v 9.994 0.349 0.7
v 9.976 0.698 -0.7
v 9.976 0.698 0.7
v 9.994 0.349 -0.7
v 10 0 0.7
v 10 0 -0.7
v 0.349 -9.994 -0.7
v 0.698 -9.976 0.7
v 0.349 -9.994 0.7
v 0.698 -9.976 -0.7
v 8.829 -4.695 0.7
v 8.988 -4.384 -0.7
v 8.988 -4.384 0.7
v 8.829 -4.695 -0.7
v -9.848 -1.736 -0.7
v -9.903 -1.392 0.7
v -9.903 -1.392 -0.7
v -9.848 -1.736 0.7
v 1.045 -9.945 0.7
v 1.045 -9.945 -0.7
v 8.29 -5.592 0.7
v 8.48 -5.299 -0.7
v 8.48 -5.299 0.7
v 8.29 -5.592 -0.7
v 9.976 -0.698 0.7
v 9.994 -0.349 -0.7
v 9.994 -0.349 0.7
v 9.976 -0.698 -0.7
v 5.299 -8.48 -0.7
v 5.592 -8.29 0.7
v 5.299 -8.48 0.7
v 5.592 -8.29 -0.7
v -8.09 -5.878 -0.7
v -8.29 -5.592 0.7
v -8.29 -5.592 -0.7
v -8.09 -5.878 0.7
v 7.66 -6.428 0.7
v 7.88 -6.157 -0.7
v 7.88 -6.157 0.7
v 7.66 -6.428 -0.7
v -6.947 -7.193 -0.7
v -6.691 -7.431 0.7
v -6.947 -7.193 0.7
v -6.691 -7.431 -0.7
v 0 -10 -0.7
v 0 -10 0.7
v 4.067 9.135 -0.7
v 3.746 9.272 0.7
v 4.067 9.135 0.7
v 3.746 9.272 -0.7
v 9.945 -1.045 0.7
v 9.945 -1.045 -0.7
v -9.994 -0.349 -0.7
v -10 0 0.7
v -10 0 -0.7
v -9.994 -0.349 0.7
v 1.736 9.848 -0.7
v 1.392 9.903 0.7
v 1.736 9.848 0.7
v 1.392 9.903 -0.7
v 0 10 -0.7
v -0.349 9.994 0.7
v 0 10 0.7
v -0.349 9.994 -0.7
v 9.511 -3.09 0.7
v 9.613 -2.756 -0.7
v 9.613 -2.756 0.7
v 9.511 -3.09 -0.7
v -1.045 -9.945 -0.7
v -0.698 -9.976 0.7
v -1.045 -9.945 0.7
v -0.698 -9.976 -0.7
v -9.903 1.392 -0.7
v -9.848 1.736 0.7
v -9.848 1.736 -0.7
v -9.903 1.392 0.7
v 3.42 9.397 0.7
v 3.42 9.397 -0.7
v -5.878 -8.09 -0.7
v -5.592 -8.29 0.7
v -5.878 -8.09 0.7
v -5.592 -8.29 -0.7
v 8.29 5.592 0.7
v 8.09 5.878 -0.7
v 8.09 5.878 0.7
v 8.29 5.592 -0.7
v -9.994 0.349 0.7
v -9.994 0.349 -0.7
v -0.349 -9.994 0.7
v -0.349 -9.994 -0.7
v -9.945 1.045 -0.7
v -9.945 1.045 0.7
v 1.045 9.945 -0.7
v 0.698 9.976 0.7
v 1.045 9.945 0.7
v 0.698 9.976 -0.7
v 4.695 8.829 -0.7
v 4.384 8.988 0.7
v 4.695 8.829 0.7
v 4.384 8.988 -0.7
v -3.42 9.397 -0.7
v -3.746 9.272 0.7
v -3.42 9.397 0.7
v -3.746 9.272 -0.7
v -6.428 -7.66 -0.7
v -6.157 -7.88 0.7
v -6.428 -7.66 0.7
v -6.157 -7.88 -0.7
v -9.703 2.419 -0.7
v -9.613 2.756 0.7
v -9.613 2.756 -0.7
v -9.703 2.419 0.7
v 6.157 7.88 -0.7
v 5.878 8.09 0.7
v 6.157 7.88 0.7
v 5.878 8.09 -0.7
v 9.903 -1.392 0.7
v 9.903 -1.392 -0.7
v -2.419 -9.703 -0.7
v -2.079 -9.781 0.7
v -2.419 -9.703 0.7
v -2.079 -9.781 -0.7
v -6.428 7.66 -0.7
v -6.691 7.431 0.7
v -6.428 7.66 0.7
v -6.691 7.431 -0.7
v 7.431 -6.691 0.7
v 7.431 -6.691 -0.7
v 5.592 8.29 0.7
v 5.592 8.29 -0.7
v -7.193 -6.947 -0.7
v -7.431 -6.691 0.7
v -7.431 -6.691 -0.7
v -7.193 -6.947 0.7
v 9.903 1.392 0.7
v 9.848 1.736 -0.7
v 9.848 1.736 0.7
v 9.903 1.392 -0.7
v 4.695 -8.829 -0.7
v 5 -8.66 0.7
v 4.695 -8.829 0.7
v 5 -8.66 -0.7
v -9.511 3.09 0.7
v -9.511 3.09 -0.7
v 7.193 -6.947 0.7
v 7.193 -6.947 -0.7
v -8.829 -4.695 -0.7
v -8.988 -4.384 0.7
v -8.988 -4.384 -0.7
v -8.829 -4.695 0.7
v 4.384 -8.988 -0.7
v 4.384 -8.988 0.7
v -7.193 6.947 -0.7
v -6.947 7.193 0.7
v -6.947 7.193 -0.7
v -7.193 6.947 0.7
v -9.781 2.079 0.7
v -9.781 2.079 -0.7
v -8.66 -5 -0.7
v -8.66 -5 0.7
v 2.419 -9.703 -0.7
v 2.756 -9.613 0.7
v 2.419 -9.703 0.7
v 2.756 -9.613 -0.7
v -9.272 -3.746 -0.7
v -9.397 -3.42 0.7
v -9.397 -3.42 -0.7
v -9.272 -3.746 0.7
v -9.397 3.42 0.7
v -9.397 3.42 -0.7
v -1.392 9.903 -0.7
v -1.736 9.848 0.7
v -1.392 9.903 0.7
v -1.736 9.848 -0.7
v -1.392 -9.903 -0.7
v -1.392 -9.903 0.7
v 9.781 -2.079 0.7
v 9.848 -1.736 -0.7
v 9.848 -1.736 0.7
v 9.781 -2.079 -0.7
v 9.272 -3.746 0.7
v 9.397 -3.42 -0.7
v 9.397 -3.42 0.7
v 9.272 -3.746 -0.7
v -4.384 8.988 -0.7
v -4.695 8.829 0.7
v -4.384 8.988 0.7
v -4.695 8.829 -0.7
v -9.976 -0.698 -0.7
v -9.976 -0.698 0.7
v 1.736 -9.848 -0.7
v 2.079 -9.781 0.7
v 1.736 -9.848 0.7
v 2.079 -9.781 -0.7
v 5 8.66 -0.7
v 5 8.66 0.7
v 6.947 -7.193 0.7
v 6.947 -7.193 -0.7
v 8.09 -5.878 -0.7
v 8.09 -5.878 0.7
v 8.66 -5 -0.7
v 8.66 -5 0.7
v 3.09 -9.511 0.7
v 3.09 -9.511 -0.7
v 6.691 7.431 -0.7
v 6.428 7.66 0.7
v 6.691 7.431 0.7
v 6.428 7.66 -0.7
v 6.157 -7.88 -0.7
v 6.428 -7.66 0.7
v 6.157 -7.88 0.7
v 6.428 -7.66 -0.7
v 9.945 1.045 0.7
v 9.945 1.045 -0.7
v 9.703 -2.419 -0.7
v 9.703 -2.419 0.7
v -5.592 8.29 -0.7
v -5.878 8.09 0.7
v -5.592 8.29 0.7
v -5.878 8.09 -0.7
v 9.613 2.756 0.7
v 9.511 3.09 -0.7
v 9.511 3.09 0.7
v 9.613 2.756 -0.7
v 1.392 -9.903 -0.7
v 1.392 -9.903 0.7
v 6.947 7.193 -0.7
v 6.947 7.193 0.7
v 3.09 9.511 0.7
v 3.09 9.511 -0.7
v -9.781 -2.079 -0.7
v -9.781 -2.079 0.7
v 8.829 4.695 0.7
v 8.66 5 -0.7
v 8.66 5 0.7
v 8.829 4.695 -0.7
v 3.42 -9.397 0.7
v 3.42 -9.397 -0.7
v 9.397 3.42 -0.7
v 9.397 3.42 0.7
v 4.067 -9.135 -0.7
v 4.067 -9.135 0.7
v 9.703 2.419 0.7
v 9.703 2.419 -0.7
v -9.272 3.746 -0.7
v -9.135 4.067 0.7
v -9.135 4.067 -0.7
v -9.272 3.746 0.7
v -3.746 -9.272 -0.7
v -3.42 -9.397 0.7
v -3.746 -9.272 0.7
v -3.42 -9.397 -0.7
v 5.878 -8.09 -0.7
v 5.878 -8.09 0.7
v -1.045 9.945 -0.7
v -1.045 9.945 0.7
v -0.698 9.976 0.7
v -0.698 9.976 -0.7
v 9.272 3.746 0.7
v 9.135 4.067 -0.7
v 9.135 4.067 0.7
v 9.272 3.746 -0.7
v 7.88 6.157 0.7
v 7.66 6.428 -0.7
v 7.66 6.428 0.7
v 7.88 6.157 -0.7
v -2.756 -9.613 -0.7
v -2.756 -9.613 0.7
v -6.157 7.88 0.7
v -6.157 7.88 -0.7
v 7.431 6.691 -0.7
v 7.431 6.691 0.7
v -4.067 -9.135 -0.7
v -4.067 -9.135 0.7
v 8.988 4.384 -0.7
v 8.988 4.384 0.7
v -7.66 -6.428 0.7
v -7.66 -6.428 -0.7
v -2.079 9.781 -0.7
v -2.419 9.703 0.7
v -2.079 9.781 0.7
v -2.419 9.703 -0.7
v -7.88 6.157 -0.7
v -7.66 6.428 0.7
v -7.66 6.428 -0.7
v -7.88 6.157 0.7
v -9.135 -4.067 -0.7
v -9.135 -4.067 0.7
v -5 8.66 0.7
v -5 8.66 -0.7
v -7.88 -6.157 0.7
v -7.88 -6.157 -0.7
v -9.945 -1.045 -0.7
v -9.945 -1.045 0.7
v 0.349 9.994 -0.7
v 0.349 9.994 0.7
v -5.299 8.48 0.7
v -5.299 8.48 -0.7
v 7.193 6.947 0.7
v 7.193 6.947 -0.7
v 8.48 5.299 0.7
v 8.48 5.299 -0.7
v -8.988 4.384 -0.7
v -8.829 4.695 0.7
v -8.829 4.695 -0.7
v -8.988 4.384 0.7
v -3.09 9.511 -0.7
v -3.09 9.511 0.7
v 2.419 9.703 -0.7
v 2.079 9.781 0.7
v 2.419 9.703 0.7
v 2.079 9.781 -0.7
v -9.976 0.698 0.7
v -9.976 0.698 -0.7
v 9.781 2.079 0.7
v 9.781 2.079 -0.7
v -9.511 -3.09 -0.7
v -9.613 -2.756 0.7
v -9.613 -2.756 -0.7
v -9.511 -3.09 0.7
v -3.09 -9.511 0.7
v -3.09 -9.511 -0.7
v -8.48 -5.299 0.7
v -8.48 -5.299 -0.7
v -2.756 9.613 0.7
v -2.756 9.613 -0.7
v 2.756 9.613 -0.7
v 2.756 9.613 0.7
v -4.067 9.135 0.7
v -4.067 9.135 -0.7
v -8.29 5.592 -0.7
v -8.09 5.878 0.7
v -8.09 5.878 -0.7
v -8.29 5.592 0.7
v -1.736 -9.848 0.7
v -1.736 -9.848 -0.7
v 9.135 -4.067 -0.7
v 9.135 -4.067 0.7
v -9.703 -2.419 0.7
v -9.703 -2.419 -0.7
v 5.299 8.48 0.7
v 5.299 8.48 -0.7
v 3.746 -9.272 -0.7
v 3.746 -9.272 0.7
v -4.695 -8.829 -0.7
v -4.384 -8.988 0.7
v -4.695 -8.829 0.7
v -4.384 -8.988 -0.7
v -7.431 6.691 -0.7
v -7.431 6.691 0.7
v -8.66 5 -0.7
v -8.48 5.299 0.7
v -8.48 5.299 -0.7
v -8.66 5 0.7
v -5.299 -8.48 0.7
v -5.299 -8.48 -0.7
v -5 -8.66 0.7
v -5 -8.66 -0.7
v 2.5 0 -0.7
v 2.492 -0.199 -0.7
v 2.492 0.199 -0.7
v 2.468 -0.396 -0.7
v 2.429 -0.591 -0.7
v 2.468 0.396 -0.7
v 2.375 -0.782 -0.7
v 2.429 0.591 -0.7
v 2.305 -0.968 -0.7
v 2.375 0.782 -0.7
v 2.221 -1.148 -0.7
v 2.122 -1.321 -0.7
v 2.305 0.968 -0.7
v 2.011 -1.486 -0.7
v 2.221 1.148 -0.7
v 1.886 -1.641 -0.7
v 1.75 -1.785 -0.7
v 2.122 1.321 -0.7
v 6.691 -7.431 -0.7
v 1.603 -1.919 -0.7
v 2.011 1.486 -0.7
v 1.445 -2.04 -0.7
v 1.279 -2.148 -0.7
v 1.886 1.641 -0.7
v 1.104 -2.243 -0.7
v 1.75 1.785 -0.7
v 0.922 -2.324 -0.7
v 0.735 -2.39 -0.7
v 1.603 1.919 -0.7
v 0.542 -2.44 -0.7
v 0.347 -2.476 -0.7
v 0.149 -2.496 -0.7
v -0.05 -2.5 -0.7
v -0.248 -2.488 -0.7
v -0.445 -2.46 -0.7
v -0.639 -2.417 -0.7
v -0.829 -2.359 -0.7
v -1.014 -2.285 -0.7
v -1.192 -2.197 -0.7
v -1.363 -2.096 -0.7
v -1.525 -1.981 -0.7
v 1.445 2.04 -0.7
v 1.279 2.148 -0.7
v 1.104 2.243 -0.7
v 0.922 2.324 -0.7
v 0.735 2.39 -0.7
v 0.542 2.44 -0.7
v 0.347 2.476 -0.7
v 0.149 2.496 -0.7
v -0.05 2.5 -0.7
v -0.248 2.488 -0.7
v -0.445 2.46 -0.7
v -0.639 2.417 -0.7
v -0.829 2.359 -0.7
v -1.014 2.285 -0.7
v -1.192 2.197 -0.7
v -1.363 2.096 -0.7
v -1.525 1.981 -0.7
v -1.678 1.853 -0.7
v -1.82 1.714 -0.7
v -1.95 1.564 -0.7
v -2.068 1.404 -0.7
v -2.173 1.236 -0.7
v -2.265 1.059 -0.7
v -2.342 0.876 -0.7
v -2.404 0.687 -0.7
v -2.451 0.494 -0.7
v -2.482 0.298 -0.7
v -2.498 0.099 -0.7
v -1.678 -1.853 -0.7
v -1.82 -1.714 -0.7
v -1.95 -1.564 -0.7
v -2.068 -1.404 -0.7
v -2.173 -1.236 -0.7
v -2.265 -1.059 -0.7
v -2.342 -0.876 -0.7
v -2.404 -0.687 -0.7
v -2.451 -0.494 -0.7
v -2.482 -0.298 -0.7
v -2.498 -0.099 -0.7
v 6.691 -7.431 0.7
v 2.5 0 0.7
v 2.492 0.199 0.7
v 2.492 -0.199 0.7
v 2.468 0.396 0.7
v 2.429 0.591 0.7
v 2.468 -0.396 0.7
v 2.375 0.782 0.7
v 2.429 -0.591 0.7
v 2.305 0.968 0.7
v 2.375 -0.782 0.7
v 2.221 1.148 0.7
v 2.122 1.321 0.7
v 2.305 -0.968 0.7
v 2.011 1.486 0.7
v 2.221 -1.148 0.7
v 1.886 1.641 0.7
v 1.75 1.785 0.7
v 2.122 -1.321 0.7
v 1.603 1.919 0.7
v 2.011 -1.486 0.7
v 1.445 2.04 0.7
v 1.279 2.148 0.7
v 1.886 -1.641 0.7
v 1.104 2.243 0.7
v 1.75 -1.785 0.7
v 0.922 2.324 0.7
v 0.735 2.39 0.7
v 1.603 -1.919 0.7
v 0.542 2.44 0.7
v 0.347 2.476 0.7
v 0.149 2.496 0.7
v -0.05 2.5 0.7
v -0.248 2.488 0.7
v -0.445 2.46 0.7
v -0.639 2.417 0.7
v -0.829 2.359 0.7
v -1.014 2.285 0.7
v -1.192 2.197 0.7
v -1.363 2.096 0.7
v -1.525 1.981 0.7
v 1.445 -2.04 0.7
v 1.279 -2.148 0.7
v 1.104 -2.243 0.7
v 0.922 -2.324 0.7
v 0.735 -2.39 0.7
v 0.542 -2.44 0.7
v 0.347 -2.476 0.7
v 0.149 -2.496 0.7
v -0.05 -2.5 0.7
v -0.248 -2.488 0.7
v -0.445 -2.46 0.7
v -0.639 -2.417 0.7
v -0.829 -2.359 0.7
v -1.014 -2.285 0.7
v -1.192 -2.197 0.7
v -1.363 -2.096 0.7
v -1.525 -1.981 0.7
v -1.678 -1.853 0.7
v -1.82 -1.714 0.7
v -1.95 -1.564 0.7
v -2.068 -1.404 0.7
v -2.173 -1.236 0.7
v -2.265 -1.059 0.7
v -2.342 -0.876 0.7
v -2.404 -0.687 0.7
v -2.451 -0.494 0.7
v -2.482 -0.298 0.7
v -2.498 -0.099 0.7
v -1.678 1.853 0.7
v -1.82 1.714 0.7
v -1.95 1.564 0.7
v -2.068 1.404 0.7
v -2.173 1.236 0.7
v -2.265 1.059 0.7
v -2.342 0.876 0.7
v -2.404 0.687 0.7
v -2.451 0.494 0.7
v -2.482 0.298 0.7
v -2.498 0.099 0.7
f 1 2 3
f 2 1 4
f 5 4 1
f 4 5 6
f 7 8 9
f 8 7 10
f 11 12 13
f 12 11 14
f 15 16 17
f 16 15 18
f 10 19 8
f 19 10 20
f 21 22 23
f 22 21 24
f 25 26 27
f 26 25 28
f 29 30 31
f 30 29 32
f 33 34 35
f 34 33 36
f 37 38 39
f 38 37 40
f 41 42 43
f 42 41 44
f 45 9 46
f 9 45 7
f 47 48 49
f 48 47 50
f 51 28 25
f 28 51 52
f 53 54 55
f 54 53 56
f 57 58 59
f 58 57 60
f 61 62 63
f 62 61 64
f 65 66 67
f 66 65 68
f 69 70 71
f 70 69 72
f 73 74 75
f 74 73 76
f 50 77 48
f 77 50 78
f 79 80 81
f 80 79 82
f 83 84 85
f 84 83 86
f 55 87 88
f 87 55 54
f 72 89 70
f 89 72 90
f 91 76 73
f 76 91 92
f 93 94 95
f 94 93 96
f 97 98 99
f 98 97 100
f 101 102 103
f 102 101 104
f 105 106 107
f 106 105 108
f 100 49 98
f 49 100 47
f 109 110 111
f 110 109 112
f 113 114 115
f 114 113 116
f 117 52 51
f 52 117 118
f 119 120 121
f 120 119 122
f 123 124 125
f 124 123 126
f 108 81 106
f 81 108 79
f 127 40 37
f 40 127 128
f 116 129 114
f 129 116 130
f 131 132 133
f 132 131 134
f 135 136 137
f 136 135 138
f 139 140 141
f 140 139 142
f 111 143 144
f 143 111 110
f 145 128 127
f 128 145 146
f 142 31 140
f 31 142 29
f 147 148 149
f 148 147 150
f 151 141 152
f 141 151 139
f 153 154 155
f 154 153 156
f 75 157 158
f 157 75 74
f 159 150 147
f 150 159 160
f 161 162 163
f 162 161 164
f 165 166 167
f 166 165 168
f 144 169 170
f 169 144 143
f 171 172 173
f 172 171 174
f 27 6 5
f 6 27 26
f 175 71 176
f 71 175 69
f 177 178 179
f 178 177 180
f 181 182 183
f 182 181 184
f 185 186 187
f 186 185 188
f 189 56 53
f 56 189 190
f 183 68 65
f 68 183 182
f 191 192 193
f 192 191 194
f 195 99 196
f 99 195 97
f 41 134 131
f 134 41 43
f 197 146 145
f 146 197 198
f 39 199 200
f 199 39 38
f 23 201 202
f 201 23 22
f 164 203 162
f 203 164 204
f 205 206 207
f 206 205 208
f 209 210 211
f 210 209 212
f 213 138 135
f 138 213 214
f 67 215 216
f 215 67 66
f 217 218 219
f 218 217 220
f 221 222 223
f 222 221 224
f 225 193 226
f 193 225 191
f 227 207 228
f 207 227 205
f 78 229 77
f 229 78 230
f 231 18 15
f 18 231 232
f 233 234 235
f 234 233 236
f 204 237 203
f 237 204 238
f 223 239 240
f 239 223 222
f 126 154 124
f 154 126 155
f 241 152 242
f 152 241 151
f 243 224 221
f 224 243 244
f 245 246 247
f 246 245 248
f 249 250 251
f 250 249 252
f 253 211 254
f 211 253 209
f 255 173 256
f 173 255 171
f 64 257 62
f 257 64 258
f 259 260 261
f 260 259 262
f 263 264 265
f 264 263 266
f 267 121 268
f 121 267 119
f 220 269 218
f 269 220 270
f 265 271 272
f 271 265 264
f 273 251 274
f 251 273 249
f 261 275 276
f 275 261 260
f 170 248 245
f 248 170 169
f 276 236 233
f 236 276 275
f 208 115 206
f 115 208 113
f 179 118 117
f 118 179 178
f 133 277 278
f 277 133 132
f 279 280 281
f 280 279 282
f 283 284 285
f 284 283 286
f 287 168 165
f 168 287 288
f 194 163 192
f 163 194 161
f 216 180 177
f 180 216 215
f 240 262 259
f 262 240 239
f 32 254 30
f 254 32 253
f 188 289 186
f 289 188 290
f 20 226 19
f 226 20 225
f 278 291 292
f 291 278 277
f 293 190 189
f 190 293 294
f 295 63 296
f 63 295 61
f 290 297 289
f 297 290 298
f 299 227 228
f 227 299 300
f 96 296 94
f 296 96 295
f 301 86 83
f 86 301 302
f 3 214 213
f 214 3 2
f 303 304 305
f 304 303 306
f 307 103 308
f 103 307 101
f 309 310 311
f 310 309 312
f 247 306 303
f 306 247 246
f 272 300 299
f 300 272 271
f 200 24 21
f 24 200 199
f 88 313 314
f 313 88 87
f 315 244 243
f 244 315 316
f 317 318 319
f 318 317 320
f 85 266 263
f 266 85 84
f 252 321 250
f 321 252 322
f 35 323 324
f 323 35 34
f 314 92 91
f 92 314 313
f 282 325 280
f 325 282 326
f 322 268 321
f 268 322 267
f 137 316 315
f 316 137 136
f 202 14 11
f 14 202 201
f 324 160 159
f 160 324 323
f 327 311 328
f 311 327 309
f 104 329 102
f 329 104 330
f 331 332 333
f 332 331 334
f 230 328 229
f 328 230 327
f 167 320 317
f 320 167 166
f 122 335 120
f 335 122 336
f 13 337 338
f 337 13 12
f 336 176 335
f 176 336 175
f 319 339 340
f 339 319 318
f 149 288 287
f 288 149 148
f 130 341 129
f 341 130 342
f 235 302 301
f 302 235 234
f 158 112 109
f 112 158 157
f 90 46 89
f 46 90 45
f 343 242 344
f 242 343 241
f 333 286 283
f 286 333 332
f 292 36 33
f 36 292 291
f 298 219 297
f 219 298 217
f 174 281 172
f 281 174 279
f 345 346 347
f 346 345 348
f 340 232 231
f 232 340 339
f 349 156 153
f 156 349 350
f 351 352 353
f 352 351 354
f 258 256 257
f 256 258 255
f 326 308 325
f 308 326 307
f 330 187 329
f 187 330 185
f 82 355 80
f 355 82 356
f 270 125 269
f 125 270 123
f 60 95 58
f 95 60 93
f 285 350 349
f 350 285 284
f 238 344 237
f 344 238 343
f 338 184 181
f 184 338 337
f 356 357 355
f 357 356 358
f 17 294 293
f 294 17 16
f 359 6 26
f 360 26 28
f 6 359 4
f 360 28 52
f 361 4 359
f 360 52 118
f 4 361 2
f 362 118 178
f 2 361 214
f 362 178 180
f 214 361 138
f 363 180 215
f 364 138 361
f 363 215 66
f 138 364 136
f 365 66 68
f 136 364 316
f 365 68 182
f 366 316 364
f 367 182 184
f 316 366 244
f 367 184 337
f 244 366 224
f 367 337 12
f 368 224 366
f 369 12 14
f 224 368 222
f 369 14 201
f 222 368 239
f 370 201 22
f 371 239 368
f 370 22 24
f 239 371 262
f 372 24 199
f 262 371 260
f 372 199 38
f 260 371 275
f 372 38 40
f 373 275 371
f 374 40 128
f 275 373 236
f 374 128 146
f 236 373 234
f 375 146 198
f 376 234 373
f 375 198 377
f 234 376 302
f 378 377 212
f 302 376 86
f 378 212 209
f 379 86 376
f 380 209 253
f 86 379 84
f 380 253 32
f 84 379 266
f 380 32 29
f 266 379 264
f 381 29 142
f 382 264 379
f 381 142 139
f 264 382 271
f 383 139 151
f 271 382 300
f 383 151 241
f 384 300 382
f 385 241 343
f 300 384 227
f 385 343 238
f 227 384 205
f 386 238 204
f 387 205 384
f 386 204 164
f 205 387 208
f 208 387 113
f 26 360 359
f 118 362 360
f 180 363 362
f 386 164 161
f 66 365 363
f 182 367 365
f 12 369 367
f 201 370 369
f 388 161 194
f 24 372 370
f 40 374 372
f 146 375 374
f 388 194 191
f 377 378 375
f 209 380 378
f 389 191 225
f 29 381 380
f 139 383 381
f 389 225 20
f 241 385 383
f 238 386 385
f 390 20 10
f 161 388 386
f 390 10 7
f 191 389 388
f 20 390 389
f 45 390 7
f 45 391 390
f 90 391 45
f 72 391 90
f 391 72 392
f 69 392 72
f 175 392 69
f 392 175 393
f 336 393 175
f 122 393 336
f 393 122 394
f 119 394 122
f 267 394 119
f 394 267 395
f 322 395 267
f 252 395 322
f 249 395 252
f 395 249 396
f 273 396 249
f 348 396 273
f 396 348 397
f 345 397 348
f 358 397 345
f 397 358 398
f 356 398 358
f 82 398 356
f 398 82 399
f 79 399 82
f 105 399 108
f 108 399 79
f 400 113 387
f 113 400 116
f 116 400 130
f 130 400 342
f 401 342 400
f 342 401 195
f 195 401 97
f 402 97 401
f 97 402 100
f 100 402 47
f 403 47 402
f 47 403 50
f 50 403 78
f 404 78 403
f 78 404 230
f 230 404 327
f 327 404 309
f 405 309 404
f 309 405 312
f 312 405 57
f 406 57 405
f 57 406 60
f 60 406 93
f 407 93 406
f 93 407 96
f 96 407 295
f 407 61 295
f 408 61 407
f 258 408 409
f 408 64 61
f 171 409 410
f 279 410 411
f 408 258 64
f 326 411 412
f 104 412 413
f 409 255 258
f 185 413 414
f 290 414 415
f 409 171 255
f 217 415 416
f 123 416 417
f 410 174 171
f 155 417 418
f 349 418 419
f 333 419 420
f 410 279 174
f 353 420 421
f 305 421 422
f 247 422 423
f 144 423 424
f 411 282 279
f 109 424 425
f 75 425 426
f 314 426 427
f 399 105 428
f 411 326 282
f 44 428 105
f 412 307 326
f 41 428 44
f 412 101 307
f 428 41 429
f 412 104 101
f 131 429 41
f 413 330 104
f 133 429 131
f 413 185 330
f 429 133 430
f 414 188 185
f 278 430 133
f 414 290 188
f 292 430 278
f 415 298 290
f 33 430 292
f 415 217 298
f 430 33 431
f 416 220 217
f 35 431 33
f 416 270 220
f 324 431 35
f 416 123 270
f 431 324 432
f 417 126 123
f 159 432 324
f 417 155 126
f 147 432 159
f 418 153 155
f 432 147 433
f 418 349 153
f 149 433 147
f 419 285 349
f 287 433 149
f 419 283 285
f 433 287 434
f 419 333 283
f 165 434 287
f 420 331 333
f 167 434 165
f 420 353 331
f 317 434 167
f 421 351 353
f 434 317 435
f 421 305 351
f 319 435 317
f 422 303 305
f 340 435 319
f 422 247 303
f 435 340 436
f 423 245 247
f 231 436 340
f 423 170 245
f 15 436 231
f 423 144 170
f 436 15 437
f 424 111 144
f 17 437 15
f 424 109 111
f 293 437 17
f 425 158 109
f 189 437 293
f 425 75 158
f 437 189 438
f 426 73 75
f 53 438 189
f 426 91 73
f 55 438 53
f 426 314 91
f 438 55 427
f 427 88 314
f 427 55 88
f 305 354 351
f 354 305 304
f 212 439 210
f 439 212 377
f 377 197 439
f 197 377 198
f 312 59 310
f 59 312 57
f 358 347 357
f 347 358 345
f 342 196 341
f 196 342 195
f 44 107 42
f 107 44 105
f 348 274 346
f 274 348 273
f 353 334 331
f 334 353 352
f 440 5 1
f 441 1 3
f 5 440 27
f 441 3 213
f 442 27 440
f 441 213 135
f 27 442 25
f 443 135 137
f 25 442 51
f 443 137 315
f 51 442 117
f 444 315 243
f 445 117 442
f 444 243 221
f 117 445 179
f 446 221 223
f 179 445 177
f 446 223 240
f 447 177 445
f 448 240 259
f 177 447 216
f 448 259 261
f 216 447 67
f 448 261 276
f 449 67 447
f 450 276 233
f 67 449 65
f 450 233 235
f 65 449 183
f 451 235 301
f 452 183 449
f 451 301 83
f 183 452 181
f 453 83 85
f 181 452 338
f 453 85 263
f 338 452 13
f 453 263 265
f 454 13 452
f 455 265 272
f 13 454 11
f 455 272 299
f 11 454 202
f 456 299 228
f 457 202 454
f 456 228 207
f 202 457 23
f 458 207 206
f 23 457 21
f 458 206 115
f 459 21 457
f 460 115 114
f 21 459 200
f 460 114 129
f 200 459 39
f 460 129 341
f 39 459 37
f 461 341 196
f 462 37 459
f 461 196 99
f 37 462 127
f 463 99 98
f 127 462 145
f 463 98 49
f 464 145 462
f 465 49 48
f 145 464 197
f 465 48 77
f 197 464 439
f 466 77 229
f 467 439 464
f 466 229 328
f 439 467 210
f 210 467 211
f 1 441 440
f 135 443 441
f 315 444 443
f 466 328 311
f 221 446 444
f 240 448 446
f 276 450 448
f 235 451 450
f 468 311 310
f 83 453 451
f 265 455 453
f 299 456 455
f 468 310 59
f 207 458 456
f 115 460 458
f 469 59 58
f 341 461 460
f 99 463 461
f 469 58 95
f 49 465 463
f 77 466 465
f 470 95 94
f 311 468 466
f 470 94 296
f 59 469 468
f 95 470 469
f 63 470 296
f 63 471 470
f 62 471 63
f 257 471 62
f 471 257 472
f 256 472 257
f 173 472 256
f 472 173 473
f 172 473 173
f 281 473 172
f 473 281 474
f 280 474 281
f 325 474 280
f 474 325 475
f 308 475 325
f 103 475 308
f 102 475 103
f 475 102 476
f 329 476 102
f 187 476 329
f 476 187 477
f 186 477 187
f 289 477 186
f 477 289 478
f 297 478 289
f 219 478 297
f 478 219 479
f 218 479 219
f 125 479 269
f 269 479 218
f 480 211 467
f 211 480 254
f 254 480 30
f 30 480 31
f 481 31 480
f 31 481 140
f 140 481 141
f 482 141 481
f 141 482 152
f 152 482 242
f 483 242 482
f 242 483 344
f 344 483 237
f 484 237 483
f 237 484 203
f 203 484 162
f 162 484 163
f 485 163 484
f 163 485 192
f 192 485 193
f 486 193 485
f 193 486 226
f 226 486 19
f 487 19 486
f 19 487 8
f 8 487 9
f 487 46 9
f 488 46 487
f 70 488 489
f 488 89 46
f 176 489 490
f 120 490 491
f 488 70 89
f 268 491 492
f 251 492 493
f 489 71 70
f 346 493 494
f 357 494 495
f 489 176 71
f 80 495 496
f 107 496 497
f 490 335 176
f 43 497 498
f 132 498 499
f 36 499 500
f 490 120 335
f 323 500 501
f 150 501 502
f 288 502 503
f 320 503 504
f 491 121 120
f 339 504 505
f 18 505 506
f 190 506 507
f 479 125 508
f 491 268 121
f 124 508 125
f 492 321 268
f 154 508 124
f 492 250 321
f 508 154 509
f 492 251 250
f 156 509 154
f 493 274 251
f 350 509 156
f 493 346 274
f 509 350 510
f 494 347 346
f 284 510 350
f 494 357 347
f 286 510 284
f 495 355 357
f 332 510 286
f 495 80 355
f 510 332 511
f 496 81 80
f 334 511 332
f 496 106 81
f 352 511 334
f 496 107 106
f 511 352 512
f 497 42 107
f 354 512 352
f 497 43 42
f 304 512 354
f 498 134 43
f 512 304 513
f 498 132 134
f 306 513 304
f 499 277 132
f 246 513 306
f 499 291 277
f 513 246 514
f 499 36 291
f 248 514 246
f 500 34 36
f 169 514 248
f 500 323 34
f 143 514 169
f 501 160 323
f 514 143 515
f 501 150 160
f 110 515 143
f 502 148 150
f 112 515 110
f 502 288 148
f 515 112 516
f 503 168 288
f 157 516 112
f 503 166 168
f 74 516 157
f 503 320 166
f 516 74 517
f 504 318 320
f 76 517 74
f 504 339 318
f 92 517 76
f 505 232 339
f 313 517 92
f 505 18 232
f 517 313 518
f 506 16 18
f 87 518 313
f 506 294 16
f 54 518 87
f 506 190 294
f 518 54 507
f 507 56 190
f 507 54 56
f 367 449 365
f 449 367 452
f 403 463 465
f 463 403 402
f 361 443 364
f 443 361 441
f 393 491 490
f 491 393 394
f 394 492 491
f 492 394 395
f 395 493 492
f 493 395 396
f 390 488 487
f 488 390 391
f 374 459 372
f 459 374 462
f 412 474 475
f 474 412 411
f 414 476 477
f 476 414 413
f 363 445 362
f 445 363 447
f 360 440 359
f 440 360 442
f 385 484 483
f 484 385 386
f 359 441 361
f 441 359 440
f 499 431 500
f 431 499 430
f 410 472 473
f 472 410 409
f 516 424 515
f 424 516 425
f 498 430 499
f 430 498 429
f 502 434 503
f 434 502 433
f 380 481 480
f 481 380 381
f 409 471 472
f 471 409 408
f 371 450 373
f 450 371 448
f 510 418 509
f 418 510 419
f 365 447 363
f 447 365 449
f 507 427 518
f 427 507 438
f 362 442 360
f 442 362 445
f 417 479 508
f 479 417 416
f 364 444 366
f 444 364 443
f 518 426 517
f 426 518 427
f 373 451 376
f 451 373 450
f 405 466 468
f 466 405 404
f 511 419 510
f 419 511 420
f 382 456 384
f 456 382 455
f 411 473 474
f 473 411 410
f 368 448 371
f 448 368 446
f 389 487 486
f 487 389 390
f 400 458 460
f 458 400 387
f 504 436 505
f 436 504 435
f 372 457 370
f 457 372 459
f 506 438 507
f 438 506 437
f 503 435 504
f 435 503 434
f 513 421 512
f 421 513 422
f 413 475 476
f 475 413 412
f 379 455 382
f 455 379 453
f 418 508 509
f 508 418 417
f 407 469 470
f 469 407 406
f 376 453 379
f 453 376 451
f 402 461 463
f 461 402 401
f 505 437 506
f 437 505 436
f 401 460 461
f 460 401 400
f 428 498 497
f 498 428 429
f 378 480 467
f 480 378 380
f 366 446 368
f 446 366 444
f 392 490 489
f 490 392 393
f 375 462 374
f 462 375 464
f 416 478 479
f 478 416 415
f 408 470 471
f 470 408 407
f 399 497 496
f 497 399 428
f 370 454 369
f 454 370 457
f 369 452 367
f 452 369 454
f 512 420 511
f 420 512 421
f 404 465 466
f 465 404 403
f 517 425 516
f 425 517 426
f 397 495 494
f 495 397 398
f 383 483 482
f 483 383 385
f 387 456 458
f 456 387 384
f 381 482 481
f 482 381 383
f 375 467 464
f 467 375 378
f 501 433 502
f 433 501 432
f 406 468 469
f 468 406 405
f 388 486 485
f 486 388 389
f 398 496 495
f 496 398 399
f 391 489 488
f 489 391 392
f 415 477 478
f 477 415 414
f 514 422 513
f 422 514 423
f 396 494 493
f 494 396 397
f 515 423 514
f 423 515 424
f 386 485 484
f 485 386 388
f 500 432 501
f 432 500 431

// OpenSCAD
// Penny washer: 5.0mm ID, 20.0mm OD, 1.4mm thickness

inner_diameter = 5.0;
outer_diameter = 20.0;
thickness      = 1.4;

$fa = 2;   // finer angular resolution for smooth circles
$fs = 0.2; // finer segment length for smooth circles

module penny_washer(id=inner_diameter, od=outer_diameter, h=thickness) {
    difference() {
        cylinder(d=od, h=h, center=true);
        // Through-hole: extend beyond thickness to guarantee a clean cut
        cylinder(d=id, h=h + 2, center=true);
    }
}

penny_washer();
